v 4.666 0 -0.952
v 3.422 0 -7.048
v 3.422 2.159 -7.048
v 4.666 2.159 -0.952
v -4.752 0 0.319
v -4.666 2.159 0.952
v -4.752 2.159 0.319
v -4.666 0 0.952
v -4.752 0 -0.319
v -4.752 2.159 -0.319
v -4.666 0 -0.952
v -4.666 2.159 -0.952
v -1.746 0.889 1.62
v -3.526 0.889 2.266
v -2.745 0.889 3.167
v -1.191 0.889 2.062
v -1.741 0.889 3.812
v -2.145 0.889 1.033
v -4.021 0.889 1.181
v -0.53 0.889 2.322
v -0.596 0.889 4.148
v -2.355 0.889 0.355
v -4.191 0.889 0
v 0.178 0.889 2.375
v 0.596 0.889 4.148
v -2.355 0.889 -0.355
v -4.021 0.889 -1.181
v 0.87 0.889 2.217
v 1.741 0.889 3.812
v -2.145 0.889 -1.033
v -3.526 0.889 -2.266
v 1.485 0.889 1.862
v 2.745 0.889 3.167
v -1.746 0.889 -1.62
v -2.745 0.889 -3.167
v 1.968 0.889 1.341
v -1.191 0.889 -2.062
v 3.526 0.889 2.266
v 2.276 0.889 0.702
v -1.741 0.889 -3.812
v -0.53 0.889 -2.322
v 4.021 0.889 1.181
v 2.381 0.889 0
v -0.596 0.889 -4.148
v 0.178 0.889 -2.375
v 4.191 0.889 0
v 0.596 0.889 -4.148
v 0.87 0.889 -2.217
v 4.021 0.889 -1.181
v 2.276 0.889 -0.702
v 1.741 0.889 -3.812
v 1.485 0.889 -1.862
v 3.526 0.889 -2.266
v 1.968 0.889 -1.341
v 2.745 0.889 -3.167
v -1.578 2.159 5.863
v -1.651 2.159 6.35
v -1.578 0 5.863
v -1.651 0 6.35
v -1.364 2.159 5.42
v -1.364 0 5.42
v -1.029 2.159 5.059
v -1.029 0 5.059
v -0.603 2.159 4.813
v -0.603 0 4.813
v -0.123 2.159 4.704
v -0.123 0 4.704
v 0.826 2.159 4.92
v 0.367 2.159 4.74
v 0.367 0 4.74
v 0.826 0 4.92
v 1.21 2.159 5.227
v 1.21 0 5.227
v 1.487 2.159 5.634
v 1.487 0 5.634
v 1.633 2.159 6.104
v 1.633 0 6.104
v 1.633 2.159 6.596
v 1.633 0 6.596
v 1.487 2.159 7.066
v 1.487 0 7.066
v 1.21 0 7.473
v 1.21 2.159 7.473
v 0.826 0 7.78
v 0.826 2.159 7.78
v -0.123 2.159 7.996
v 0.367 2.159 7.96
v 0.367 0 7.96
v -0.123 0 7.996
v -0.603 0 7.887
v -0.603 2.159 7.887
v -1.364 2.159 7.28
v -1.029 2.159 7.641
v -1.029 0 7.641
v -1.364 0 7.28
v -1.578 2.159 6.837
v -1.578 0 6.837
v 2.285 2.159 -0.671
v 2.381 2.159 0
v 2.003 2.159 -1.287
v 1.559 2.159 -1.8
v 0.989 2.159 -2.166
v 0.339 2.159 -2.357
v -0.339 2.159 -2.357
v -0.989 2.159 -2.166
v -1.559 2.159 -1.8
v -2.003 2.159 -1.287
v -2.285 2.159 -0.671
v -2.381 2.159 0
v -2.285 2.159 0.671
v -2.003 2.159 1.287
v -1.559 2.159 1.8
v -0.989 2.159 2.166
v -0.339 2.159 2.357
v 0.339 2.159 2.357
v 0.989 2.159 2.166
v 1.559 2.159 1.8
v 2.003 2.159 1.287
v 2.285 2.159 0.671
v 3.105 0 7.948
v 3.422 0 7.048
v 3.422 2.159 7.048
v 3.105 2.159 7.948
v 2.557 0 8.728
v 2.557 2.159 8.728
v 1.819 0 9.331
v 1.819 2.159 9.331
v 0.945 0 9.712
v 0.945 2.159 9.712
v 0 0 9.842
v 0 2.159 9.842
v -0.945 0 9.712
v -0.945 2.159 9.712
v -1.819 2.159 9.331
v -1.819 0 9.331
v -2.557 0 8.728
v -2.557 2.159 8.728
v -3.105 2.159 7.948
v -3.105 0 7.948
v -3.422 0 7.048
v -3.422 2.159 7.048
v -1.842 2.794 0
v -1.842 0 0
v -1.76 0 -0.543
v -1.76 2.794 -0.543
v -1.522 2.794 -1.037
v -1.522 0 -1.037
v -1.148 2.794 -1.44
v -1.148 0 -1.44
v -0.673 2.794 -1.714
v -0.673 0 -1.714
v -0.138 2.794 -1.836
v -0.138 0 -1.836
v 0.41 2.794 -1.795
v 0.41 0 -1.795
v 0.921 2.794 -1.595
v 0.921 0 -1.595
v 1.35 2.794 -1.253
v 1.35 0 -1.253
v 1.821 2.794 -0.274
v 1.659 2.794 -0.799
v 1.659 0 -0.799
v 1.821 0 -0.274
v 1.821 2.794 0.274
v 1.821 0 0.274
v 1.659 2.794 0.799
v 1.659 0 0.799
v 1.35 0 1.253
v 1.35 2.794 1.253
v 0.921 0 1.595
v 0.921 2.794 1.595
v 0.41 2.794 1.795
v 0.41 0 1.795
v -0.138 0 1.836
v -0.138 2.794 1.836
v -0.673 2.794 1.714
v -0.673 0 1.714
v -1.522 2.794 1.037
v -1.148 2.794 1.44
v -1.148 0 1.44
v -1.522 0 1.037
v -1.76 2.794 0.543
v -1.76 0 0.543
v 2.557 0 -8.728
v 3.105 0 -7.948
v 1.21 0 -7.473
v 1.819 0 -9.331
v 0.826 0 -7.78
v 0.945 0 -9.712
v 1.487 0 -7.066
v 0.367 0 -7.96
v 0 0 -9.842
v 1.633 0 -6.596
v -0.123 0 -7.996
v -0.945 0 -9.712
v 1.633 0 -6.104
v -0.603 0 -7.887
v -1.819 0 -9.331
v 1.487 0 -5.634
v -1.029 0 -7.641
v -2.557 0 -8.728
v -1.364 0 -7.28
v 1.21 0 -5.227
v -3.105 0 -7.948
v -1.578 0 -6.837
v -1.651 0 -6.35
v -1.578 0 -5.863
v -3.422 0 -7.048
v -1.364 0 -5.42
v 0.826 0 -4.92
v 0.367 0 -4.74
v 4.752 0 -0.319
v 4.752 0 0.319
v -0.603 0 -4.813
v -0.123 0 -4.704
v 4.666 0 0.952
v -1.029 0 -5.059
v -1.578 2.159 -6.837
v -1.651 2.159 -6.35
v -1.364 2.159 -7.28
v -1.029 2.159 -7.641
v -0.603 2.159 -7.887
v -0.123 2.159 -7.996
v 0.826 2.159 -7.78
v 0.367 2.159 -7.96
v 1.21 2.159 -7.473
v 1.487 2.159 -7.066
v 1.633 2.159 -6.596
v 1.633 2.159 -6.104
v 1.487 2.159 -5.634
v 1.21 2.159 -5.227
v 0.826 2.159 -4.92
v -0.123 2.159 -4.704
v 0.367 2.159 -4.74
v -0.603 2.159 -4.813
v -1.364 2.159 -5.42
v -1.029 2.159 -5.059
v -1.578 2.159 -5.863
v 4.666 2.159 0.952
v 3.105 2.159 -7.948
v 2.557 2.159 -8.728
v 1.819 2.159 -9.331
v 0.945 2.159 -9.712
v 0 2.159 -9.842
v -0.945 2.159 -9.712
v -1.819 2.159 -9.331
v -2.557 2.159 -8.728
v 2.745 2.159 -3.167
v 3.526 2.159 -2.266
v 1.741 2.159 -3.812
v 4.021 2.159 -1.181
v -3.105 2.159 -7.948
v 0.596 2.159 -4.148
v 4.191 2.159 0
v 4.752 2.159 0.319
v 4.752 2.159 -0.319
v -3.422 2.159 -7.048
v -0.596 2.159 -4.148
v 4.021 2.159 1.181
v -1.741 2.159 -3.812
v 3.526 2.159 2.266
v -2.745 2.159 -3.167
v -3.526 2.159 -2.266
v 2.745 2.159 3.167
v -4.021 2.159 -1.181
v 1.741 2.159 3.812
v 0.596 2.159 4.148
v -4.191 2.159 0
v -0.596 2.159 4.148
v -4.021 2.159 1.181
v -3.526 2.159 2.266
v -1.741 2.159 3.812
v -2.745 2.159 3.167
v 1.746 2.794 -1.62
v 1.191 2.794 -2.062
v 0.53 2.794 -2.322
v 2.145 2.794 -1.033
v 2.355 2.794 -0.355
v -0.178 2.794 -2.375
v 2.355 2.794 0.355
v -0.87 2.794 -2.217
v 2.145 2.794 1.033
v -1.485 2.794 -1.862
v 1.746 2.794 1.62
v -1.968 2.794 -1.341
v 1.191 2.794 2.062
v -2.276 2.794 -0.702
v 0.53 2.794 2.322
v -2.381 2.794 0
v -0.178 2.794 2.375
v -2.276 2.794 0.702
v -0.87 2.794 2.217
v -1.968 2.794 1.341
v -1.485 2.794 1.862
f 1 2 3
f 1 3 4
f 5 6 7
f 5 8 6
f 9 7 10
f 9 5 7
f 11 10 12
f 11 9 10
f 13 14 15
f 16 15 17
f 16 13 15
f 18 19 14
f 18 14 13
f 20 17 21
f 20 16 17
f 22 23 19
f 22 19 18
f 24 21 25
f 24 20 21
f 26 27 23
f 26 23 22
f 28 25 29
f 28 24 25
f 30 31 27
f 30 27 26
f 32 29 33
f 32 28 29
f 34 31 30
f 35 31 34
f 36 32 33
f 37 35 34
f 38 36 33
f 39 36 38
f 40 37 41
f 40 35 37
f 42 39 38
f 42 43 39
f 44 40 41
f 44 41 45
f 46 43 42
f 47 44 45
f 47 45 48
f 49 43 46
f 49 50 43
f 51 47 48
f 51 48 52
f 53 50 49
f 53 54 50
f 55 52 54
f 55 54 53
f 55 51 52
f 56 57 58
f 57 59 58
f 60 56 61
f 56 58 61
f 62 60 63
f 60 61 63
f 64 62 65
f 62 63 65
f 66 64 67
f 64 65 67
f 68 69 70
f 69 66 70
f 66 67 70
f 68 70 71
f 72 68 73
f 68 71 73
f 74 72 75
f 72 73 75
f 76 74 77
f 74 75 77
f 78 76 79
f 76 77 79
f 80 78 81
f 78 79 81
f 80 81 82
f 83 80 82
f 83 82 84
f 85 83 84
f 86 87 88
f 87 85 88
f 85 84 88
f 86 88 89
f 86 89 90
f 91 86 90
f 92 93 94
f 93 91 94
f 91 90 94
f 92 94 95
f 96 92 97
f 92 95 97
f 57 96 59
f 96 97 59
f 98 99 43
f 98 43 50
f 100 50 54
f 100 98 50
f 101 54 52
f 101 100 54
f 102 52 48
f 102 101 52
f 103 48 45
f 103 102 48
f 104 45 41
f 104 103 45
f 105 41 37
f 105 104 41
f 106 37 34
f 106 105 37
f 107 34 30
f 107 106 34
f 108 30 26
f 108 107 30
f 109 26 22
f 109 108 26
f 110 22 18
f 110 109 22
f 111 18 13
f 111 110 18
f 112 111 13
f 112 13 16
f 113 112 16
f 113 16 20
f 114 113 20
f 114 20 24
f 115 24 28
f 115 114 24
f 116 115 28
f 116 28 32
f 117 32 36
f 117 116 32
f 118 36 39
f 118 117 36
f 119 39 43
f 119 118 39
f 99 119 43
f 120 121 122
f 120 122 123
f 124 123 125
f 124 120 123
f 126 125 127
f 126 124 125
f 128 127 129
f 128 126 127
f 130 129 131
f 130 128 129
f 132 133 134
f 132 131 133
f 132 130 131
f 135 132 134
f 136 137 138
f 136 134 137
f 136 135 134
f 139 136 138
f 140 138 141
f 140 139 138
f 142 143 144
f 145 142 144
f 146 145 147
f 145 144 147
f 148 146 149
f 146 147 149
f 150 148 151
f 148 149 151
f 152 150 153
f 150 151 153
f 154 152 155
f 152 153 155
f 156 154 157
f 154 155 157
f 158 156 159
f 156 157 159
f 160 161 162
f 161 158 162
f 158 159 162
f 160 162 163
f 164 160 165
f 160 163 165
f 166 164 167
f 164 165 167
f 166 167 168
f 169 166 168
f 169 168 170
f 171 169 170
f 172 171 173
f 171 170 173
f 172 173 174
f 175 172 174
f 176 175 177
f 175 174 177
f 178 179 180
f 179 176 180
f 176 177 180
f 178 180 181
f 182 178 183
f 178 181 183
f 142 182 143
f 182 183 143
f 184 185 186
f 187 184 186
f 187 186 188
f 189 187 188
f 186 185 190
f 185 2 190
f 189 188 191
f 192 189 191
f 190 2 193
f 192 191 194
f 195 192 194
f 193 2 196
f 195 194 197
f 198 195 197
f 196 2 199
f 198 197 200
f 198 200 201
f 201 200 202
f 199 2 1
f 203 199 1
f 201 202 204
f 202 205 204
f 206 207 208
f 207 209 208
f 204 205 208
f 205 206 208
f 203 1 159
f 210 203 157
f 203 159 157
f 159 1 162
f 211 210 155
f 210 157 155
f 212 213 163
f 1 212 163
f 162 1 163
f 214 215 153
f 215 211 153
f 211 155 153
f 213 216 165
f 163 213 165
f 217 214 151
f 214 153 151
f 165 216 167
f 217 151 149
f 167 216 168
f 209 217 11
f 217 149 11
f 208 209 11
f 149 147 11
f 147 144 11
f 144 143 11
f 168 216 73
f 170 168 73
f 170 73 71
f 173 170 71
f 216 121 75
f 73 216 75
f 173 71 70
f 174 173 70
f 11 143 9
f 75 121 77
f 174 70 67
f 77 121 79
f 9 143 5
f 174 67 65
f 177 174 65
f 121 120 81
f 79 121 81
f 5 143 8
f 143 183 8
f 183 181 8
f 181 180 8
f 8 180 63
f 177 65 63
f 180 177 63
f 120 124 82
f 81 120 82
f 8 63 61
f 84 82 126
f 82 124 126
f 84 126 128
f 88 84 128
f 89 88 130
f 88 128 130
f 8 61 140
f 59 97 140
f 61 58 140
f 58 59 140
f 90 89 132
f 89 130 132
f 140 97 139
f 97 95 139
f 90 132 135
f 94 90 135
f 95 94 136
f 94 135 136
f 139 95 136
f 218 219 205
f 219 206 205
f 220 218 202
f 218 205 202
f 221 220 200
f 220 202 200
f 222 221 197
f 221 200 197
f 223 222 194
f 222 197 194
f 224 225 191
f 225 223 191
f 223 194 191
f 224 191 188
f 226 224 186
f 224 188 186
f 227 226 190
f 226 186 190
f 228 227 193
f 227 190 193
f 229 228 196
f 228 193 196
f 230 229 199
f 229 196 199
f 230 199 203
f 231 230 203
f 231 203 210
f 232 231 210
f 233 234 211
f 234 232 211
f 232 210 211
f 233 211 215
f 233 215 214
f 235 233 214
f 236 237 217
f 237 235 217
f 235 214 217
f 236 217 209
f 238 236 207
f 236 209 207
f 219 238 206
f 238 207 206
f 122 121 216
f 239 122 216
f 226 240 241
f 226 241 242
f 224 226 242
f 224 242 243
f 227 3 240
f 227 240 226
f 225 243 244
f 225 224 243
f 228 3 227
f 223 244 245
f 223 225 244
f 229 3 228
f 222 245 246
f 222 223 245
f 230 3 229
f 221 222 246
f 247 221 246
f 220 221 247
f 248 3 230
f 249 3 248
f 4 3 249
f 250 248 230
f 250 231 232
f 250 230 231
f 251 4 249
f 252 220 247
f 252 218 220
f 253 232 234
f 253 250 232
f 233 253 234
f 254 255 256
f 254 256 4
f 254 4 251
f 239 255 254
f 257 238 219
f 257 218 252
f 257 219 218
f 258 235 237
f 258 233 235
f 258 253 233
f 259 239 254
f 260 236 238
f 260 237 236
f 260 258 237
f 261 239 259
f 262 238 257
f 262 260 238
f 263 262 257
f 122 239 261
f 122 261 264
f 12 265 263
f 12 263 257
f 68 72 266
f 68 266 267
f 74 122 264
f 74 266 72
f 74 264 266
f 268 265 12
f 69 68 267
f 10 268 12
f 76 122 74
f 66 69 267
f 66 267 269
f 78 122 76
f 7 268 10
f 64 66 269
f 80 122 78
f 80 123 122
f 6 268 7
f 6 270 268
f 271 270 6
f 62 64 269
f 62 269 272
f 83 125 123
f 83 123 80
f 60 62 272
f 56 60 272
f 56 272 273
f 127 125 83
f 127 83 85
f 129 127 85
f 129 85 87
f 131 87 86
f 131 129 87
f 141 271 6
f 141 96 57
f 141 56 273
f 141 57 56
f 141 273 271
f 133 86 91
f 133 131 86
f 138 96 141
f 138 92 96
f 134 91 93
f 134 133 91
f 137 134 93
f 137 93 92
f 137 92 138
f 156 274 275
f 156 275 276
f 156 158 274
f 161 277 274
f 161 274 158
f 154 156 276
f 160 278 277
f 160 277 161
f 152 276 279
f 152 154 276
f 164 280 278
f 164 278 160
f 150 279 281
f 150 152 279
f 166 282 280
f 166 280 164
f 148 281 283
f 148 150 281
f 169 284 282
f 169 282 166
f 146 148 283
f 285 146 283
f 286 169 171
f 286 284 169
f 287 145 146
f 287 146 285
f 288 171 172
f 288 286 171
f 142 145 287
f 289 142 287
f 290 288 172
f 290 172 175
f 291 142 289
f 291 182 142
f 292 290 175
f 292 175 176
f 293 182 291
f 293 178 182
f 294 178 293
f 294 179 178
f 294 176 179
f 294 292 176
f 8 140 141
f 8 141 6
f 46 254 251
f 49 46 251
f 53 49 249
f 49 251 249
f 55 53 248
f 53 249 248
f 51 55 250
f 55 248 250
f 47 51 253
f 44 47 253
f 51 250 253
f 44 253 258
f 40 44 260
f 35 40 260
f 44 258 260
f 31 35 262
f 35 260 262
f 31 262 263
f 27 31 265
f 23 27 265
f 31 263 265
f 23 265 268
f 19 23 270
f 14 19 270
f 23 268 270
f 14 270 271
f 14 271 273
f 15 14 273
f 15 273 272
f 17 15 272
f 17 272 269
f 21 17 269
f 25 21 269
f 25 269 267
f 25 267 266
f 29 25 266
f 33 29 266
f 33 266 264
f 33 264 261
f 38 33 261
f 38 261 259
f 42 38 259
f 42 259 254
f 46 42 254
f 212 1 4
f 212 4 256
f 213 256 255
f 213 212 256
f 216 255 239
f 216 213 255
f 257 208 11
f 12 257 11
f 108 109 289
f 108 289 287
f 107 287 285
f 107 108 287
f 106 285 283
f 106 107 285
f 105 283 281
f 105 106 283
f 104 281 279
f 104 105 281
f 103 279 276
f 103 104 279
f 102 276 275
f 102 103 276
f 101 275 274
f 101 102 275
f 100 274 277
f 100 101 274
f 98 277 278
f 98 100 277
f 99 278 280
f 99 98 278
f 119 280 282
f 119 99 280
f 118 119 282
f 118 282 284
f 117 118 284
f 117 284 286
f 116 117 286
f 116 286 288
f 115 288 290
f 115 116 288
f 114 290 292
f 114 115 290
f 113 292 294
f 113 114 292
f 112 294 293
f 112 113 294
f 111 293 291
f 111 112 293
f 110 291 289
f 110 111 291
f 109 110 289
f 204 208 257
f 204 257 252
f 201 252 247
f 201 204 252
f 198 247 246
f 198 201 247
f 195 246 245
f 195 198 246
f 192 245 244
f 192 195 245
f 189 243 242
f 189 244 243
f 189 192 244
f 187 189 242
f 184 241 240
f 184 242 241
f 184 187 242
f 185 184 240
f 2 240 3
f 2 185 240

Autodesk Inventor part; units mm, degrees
ref_plane "YZ Plane" through (0, 0, 0) normal (1, 0, 0) x (0, 1, 0)
ref_plane "XZ Plane" through (0, 0, 0) normal (0, 1, 0) x (-1, 0, 0)
ref_plane "XY Plane" through (0, 0, 0) normal (0, 0, 1) x (1, 0, 0)
sketch "Sketch1" plane through (0, 0, 0) normal (0, 1, 0) x (-1, 0, 0)
  circle A0 centre (0, 0) radius 1.8415
  circle A1 centre (0, 0) radius 2.3813
  circle A2 centre (0, -6.35) radius 1.651
  circle A3 centre (0, 6.35) radius 1.651
  arc A4 (3.4219, 7.0485) -> (-3.4219, 7.0485) centre (0, 6.35) ccw
  arc A5 (-3.4219, -7.0485) -> (3.4219, -7.0485) centre (0, -6.35) ccw
  line L0 (3.4219, 7.0485) -> (4.6663, 0.9525)
  line L1 (-3.4219, 7.0485) -> (-4.6663, 0.9525)
  line L2 (3.4219, -7.0485) -> (4.6663, -0.9525)
  line L3 (-3.4219, -7.0485) -> (-4.6663, -0.9525)
  arc A6 (4.6663, -0.9525) -> (4.6663, 0.9525) centre (0, 0) ccw
  arc A7 (-4.6663, 0.9525) -> (-4.6663, -0.9525) centre (0, 0) ccw
  dimension "d0" = 3.683
  dimension "d1" = 4.7625
  dimension "d3" = 3.302
  dimension "d4" = 3.302
  dimension "d5" = 6.985
  dimension "d6" = 6.985
  dimension "d7" = 6.35
  dimension "d8" = 6.35
  dimension "d9" = 4.7625
extrude "Extrusion1" add sketch "Sketch1" along normal blind 2.159 contours A1 | L0 A6 L2 A5 L3 A7 L1 A4
extrude "Extrusion2" add sketch "Sketch1" along normal blind 2.794 contours A1
sketch "Sketch3" plane through (0, 2.159, 0) normal (0, 1, 0) x (1, 0, 0)
  circle A0 centre (0, 0) radius 4.191
  circle A1 centre (0, 0) radius 2.3813 projected
  dimension "d14" = 8.382
extrude "Extrusion3" cut sketch "Sketch3" against normal blind 1.27
equation "\"d8\" = d7"
properties part number "tetherSeal"
